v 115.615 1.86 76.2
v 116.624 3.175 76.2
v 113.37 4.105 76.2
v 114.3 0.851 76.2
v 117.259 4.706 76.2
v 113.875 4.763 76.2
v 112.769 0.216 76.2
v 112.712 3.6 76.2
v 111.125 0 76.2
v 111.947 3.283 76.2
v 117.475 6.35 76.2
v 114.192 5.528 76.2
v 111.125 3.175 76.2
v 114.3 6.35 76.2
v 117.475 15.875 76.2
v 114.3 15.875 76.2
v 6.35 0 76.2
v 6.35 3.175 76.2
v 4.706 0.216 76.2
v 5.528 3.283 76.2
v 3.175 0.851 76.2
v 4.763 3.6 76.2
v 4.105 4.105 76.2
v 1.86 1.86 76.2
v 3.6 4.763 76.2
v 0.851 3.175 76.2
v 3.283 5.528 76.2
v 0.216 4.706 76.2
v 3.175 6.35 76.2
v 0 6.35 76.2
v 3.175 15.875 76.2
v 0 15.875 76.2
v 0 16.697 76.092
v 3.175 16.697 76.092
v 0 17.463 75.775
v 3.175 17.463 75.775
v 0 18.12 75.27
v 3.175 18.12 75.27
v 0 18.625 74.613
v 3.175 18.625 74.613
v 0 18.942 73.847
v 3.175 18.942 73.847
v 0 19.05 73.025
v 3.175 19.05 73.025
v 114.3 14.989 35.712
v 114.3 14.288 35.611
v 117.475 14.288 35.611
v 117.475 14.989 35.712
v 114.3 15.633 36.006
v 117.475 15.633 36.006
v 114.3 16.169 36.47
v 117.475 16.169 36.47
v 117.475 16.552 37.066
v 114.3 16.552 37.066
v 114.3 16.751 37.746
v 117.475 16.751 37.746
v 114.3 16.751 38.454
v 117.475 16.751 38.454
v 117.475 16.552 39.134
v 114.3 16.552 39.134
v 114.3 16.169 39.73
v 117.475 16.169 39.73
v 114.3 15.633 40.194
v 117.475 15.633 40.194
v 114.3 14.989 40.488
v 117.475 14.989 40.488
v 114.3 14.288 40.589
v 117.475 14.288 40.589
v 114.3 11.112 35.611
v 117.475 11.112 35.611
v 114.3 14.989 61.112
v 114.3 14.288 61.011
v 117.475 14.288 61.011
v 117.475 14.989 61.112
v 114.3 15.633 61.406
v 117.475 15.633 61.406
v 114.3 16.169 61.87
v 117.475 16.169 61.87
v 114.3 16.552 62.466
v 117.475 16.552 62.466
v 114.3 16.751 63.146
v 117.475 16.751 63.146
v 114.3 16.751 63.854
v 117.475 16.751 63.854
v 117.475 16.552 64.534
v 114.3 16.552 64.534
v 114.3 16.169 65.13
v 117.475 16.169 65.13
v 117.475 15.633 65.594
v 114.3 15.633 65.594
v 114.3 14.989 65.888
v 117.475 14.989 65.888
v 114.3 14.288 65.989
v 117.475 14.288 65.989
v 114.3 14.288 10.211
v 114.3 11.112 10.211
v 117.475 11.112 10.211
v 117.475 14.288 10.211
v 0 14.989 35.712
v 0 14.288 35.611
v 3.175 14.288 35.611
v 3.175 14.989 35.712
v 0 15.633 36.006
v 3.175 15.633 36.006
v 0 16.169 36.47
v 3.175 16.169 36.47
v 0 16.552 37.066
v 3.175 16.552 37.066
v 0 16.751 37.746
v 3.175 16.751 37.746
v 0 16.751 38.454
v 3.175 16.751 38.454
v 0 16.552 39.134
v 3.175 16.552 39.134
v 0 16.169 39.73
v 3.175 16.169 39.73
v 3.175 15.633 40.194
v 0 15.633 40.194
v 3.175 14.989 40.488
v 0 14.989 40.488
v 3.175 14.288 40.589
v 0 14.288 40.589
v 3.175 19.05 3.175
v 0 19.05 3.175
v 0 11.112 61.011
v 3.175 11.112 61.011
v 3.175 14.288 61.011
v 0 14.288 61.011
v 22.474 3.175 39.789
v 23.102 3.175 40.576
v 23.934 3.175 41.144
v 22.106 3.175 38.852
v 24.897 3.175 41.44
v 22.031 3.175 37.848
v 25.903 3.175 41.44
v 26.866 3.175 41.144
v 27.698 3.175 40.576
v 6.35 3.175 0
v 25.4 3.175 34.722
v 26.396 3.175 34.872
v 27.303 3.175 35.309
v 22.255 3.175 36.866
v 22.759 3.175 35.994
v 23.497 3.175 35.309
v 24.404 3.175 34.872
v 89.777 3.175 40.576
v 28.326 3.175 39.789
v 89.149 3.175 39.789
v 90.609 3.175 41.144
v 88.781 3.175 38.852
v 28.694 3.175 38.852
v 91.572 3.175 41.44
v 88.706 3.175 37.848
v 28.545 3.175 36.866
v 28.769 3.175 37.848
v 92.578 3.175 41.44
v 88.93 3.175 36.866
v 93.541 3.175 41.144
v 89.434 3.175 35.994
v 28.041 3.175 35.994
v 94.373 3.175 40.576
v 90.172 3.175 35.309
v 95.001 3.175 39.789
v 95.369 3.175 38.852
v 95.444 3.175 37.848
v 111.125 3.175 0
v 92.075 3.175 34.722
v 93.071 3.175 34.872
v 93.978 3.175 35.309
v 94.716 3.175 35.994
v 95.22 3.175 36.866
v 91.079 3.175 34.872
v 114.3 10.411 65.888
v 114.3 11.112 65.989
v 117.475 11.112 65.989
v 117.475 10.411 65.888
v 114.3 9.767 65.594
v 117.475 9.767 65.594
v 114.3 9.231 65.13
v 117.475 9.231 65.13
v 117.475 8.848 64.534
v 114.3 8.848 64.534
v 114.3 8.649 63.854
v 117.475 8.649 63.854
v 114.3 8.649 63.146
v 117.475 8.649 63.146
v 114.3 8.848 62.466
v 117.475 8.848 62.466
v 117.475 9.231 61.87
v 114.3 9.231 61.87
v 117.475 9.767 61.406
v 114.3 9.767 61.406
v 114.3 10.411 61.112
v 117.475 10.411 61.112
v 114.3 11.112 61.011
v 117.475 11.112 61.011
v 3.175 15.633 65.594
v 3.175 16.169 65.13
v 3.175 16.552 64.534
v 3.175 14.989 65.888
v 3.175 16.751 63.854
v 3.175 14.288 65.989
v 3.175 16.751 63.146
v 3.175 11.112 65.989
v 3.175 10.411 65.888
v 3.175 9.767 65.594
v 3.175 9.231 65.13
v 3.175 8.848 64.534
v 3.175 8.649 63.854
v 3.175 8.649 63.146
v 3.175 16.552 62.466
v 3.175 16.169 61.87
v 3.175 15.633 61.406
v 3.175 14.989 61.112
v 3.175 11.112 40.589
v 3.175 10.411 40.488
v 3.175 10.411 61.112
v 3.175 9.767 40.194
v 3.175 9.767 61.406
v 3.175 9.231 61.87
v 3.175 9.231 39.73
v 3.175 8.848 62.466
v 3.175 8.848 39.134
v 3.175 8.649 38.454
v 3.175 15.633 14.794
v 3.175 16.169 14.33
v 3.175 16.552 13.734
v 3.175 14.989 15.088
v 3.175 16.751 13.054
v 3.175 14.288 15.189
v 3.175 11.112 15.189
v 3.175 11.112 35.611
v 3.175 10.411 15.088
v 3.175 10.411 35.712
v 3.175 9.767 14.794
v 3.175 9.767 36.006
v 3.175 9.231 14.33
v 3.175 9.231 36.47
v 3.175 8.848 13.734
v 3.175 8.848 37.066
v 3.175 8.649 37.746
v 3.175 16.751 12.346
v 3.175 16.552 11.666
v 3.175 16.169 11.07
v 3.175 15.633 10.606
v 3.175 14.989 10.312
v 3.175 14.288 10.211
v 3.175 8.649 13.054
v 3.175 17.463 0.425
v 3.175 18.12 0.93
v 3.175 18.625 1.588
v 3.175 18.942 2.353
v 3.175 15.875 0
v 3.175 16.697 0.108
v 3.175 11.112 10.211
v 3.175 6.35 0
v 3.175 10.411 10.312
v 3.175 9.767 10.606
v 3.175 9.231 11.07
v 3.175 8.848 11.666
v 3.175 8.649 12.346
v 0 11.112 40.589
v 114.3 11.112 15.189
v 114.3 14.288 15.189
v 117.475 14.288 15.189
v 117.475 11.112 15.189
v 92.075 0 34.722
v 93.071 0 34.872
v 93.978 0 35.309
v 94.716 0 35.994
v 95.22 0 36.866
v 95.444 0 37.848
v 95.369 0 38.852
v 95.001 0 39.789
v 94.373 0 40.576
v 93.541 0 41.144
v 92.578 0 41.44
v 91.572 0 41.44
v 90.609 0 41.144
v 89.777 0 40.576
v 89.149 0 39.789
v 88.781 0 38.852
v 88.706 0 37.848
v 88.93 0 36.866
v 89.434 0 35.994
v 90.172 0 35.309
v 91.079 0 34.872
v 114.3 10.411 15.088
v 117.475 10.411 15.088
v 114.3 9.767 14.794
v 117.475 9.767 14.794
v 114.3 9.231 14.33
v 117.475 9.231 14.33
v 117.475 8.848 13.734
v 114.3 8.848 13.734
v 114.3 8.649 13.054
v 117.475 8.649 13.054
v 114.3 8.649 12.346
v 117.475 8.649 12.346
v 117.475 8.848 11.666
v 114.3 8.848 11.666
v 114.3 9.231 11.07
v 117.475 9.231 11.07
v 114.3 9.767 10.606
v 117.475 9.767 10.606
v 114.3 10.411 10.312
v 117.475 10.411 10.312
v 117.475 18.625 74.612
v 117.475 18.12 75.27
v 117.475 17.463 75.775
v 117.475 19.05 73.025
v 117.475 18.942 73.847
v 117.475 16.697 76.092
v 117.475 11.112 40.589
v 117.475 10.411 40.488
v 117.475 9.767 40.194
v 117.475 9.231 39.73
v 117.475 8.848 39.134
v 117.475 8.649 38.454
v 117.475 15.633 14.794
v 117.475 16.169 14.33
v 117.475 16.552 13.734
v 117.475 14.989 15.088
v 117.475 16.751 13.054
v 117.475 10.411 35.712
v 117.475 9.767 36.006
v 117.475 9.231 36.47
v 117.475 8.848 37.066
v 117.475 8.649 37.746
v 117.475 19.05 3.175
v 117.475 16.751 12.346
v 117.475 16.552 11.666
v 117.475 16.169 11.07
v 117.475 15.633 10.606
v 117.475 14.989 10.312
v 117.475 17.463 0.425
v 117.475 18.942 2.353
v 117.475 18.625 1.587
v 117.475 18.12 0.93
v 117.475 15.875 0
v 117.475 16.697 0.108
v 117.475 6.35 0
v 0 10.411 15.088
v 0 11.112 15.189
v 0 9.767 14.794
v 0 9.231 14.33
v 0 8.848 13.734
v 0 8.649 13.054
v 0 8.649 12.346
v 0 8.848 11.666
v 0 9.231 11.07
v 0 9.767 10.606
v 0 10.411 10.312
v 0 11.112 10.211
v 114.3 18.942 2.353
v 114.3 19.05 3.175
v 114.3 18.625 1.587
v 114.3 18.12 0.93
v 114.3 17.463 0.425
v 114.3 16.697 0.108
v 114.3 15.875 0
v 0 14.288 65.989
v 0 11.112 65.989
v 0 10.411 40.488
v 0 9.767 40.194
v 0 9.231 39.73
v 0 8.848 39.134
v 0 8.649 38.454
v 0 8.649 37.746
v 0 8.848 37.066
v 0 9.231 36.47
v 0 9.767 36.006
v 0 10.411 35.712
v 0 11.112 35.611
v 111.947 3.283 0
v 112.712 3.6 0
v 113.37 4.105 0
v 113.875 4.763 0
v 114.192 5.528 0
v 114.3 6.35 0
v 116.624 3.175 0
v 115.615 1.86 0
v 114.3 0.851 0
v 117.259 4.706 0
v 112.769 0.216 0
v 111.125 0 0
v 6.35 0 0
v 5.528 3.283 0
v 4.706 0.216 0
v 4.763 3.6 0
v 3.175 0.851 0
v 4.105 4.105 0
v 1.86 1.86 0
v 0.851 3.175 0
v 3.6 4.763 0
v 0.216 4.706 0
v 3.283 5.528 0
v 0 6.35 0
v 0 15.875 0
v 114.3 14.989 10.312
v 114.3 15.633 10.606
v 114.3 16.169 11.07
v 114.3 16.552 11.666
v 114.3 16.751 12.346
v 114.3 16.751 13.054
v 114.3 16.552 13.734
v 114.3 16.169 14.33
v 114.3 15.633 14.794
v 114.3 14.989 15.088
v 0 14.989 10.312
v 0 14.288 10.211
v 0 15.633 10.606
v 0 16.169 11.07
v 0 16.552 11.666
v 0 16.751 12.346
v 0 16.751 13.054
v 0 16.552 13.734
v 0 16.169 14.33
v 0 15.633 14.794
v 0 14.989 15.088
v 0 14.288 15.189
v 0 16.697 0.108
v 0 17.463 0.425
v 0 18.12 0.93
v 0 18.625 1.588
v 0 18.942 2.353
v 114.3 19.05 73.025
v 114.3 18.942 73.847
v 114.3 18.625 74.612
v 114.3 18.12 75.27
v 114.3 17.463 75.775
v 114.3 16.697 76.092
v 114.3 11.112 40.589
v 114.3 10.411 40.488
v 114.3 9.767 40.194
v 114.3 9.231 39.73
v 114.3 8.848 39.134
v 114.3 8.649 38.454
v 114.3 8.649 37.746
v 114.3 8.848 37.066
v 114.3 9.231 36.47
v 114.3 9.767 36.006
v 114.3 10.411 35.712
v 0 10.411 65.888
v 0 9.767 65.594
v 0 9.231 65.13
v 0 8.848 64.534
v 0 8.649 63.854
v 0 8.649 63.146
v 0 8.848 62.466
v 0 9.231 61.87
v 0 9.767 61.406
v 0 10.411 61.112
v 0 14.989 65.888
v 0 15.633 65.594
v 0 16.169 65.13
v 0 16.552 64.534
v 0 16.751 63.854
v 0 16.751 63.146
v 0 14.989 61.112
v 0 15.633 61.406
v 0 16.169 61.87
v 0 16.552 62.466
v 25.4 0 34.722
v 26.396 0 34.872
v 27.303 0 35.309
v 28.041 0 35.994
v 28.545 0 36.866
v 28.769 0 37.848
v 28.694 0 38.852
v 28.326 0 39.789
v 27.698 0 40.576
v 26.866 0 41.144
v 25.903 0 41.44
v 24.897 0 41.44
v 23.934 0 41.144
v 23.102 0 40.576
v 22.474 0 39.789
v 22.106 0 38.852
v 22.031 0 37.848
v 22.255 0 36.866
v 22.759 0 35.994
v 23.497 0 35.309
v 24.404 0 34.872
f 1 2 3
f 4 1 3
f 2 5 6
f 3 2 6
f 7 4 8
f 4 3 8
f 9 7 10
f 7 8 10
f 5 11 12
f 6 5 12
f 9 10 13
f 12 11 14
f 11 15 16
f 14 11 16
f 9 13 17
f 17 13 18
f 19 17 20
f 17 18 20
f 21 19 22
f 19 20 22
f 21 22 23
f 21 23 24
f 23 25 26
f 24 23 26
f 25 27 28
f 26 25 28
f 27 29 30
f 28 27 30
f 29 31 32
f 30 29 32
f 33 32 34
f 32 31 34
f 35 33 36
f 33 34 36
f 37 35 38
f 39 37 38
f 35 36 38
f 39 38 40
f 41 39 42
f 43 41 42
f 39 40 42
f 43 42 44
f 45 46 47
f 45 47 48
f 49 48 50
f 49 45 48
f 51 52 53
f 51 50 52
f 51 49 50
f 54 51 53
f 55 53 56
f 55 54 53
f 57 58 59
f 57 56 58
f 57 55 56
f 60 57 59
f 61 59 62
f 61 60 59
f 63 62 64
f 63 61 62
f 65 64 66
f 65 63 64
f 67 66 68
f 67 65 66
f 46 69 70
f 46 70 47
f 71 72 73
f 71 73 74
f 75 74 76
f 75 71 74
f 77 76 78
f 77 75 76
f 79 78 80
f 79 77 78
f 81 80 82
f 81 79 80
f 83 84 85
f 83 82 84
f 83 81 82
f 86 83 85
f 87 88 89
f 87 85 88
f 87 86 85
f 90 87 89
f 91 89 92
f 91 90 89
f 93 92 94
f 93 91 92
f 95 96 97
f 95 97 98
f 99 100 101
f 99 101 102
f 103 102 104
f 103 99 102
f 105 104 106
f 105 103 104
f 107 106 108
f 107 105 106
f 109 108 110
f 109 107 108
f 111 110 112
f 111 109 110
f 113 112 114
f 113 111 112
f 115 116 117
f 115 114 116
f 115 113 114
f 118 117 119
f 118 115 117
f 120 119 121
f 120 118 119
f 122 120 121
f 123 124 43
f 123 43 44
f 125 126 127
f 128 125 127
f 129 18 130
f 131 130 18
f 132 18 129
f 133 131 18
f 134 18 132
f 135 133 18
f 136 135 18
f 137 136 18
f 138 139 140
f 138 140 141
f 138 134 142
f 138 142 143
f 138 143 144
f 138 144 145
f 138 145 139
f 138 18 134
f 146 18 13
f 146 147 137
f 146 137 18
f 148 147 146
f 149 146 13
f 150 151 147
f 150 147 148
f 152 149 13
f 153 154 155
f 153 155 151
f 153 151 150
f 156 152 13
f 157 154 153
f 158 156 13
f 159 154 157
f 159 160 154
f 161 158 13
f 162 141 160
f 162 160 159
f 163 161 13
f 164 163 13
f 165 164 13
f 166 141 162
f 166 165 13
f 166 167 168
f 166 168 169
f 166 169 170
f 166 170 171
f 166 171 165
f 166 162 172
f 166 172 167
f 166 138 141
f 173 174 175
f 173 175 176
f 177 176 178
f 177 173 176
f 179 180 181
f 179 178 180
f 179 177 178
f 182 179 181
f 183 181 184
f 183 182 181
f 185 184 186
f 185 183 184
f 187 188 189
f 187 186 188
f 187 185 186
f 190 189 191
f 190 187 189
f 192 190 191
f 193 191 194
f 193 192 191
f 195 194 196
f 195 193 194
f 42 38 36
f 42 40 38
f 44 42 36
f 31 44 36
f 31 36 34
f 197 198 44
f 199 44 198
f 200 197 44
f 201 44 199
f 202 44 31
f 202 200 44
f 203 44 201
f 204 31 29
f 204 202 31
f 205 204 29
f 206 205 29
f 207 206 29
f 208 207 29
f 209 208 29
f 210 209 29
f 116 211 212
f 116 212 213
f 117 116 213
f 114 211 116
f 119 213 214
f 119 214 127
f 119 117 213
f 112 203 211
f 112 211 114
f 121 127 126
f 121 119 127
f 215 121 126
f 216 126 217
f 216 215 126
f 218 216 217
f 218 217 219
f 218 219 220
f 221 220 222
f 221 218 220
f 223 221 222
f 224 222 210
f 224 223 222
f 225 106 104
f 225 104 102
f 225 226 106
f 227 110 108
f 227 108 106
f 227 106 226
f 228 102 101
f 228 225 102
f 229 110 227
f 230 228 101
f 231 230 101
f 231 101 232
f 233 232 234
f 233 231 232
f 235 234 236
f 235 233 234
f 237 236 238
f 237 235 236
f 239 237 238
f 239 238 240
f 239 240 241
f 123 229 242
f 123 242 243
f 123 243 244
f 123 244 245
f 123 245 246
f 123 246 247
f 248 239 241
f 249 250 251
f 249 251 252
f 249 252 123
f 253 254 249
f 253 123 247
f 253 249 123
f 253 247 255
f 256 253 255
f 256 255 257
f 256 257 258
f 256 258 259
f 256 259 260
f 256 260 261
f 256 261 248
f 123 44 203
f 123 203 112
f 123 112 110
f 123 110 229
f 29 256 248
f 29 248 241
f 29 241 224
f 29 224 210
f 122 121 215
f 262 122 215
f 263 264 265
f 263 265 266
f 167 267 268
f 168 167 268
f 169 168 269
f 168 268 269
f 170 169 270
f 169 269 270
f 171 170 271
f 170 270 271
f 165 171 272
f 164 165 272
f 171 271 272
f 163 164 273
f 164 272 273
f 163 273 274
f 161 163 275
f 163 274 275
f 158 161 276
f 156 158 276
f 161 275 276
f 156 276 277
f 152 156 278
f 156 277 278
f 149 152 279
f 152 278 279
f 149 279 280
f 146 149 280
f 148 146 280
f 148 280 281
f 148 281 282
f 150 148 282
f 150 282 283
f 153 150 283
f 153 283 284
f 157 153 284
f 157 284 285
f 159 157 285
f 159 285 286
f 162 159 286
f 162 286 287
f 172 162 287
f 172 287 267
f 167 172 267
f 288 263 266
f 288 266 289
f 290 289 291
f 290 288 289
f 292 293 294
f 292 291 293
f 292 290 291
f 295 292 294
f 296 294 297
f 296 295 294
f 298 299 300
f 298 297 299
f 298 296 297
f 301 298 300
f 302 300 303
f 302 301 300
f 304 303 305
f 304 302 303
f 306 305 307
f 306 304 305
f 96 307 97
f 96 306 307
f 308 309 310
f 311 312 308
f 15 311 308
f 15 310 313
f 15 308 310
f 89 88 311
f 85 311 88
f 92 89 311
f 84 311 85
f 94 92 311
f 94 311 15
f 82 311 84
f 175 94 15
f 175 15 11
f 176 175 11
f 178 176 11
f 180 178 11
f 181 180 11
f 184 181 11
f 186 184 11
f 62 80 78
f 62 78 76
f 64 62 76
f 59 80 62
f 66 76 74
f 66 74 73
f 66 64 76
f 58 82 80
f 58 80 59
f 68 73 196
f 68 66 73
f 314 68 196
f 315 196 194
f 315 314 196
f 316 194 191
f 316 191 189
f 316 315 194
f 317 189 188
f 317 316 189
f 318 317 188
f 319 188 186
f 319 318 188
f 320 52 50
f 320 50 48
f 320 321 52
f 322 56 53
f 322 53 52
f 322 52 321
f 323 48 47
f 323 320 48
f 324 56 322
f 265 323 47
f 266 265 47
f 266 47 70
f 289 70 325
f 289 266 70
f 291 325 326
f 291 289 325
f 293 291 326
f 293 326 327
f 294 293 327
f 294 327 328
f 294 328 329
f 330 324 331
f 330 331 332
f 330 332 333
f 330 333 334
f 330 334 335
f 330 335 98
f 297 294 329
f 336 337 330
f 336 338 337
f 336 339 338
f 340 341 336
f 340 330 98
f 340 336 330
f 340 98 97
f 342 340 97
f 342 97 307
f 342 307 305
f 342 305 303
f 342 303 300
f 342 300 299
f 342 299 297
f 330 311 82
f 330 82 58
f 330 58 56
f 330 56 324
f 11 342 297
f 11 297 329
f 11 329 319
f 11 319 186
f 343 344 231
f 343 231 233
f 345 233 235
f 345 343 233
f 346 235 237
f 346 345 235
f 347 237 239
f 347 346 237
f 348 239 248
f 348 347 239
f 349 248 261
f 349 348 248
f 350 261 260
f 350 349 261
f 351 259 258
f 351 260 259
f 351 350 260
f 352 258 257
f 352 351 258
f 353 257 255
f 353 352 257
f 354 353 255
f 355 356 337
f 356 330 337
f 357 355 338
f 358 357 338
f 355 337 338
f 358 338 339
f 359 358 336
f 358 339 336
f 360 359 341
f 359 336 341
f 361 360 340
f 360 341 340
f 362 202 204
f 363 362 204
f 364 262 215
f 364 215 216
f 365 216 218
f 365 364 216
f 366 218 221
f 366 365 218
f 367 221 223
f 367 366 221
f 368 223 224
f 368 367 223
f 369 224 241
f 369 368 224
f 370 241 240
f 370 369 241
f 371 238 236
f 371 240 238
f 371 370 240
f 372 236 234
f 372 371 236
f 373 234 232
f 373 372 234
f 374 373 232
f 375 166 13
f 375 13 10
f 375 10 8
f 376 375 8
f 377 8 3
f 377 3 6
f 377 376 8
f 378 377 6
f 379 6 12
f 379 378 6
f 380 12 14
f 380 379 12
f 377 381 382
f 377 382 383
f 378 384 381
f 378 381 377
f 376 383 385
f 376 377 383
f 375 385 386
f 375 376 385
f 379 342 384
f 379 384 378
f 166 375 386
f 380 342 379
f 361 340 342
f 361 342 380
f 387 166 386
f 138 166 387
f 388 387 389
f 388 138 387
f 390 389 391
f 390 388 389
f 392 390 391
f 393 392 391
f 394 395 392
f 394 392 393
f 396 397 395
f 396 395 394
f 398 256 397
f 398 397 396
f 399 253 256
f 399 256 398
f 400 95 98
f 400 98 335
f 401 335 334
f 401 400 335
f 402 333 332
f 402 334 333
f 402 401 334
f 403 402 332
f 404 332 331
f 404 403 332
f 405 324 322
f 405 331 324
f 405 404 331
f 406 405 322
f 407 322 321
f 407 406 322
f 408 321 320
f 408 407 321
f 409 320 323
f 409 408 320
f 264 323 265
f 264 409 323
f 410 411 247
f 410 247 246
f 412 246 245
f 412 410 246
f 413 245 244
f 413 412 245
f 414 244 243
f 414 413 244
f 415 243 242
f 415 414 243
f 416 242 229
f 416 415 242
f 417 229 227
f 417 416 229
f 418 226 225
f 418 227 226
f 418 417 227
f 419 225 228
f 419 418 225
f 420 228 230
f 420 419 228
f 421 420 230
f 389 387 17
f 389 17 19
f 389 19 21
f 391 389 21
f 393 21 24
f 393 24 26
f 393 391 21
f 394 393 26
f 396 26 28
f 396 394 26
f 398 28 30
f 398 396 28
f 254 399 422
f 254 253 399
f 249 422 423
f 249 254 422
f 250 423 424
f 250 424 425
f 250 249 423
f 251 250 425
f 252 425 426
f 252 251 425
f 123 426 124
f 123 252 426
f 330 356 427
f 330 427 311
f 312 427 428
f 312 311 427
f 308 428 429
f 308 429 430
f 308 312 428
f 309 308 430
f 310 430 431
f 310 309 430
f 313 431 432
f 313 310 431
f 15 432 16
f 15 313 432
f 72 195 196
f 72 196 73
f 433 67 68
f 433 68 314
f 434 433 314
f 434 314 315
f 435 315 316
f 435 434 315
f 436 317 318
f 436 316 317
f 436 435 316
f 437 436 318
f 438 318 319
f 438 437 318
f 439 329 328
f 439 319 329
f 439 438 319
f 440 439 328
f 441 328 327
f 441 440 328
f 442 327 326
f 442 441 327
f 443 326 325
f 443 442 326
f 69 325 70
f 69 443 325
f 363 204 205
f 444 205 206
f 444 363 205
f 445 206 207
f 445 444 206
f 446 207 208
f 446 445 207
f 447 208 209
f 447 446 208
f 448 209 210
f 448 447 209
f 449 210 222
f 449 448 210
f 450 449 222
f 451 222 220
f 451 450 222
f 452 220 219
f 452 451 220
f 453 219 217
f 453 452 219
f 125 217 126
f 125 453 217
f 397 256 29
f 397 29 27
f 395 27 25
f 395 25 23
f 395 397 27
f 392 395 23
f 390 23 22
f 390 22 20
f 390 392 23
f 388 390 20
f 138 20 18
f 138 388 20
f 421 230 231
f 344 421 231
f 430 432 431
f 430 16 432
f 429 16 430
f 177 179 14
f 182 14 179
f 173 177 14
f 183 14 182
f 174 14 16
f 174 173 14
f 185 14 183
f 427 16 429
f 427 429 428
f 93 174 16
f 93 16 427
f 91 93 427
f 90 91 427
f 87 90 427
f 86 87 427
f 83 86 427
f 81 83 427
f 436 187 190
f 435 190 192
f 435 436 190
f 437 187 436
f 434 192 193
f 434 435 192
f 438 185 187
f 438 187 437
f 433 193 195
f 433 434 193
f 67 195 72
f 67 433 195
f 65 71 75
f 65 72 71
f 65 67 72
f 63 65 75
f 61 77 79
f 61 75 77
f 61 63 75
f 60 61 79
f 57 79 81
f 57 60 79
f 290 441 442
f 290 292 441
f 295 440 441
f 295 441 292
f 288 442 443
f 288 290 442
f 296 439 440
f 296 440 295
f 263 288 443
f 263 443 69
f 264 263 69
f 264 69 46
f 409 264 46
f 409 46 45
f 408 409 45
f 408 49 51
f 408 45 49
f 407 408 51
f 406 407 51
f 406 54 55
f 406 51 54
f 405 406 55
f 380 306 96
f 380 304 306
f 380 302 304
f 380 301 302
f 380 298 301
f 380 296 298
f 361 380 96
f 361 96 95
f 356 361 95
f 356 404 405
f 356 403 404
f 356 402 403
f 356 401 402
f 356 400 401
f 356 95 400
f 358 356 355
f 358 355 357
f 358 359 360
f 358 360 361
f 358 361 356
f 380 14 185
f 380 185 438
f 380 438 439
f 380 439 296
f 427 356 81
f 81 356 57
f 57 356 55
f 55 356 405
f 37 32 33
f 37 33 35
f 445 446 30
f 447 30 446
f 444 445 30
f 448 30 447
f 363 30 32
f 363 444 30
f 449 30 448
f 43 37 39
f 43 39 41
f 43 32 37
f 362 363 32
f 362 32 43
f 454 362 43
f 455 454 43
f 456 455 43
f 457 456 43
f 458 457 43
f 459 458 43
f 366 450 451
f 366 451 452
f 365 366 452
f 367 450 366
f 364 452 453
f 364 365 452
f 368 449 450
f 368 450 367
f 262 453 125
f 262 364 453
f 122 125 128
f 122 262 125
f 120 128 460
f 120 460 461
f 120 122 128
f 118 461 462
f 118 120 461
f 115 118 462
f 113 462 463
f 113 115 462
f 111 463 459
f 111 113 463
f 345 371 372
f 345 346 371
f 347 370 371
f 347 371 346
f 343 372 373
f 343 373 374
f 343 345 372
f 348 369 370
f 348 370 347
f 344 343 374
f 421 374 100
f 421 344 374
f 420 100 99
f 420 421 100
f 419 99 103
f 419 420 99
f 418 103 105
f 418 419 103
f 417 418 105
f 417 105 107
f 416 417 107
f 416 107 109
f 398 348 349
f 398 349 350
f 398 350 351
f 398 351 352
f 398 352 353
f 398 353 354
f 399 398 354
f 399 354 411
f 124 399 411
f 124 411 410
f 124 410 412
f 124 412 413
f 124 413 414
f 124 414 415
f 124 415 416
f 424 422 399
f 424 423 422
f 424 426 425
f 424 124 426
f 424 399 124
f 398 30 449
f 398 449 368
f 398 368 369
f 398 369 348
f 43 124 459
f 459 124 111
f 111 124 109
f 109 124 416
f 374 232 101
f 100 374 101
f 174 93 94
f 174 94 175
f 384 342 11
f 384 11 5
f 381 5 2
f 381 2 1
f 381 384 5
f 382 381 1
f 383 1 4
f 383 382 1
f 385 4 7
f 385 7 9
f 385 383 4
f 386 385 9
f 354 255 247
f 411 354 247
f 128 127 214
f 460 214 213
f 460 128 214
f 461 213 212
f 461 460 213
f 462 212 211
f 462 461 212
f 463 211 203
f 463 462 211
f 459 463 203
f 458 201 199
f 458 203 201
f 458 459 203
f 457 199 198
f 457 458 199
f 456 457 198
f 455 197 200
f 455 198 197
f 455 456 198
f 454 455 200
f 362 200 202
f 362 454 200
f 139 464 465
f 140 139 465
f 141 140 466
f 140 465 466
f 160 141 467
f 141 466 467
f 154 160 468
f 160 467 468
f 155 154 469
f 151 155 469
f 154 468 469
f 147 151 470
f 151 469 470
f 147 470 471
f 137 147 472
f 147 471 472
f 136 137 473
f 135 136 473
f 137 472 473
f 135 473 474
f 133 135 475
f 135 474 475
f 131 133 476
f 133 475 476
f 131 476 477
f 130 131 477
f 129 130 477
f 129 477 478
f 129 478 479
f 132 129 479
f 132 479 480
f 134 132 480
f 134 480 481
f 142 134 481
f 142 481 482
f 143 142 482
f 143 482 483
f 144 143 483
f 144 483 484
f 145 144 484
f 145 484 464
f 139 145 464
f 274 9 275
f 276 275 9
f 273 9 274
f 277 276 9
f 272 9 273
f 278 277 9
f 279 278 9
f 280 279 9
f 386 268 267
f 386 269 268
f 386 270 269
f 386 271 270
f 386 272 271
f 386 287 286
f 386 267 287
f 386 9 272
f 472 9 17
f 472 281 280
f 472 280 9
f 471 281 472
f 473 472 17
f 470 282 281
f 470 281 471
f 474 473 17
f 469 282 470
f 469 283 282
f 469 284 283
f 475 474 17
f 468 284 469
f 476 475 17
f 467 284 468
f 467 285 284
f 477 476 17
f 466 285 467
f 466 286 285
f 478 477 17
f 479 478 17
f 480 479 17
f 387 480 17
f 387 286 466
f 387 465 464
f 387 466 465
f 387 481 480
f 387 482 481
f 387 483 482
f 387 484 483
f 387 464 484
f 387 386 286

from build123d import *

# Parameters (mm, degrees)
BASE_FLANGE1_DEPTH = 76.2
CUT_EXTRUDE1_DEPTH = 142.314253085
SKETCH7_R          = 3.3782
CUT_EXTRUDE2_DEPTH = 142.314253085
FILLET1_R          = 3.175


# Sheet-metal steps are written as plain solids
with BuildPart() as part:
    # Sketch1 → Base-Flange1 (new body)
    with BuildSketch(Plane.XY):
        with BuildLine():
            Line((117.475, 19.05), (117.475, 6.35))
            ThreePointArc((117.475, 6.35), (115.615128061, 1.859871939), (111.125, 0))
            Line((111.125, 0), (6.35, 0))
            ThreePointArc((6.35, 0), (1.859871939, 1.859871939), (0, 6.35))
            Line((0, 6.35), (0, 19.05))
            Line((0, 19.05), (3.175, 19.05))
            Line((3.175, 19.05), (3.175, 6.35))
            ThreePointArc((3.175, 6.35), (4.10493597, 4.10493597), (6.35, 3.175))
            Line((6.35, 3.175), (111.125, 3.175))
            ThreePointArc((111.125, 3.175), (113.37006403, 4.10493597), (114.3, 6.35))
            Line((114.3, 6.35), (114.3, 19.05))
            Line((114.3, 19.05), (117.475, 19.05))
        make_face()
    extrude(amount=BASE_FLANGE1_DEPTH)

    # Sketch6 → Cut-Extrude1 (cut, through all)
    with BuildSketch(Plane.ZY):
        with BuildLine():
            Line((35.6108, 11.1125), (35.6108, 14.2875))
            ThreePointArc((35.6108, 14.2875), (38.1, 16.7767), (40.5892, 14.2875))
            Line((40.5892, 14.2875), (40.5892, 11.1125))
            ThreePointArc((40.5892, 11.1125), (38.1, 8.6233), (35.6108, 11.1125))
        make_face()
        with BuildLine():
            Line((10.2108, 11.1125), (10.2108, 14.2875))
            ThreePointArc((10.2108, 14.2875), (12.7, 16.7767), (15.1892, 14.2875))
            Line((15.1892, 14.2875), (15.1892, 11.1125))
            ThreePointArc((15.1892, 11.1125), (12.7, 8.6233), (10.2108, 11.1125))
        make_face()
        with BuildLine():
            Line((61.0108, 11.1125), (61.0108, 14.2875))
            ThreePointArc((61.0108, 14.2875), (63.5, 16.7767), (65.9892, 14.2875))
            Line((65.9892, 14.2875), (65.9892, 11.1125))
            ThreePointArc((65.9892, 11.1125), (63.5, 8.6233), (61.0108, 11.1125))
        make_face()
    extrude(amount=-CUT_EXTRUDE1_DEPTH, mode=Mode.SUBTRACT)

    # Sketch7 → Cut-Extrude2 (cut, through all)
    with BuildSketch(Plane.XZ):
        with Locations(Location((92.075, 38.1, 0), (0, 0, 270))):
            Circle(SKETCH7_R)
        with Locations(Location((25.4, 38.1, 0), (0, 0, 270))):
            Circle(SKETCH7_R)
    extrude(amount=-CUT_EXTRUDE2_DEPTH, mode=Mode.SUBTRACT)

    # Fillet1
    fillet1_edges = [part.edges().sort_by_distance(p)[0] for p in [
        (1.5875, 19.05, 0),
        (115.8875, 19.05, 0),
        (1.5875, 19.05, 76.2),
        (115.8875, 19.05, 76.2),
    ]]
    fillet(fillet1_edges, radius=FILLET1_R)


solid = part.part
